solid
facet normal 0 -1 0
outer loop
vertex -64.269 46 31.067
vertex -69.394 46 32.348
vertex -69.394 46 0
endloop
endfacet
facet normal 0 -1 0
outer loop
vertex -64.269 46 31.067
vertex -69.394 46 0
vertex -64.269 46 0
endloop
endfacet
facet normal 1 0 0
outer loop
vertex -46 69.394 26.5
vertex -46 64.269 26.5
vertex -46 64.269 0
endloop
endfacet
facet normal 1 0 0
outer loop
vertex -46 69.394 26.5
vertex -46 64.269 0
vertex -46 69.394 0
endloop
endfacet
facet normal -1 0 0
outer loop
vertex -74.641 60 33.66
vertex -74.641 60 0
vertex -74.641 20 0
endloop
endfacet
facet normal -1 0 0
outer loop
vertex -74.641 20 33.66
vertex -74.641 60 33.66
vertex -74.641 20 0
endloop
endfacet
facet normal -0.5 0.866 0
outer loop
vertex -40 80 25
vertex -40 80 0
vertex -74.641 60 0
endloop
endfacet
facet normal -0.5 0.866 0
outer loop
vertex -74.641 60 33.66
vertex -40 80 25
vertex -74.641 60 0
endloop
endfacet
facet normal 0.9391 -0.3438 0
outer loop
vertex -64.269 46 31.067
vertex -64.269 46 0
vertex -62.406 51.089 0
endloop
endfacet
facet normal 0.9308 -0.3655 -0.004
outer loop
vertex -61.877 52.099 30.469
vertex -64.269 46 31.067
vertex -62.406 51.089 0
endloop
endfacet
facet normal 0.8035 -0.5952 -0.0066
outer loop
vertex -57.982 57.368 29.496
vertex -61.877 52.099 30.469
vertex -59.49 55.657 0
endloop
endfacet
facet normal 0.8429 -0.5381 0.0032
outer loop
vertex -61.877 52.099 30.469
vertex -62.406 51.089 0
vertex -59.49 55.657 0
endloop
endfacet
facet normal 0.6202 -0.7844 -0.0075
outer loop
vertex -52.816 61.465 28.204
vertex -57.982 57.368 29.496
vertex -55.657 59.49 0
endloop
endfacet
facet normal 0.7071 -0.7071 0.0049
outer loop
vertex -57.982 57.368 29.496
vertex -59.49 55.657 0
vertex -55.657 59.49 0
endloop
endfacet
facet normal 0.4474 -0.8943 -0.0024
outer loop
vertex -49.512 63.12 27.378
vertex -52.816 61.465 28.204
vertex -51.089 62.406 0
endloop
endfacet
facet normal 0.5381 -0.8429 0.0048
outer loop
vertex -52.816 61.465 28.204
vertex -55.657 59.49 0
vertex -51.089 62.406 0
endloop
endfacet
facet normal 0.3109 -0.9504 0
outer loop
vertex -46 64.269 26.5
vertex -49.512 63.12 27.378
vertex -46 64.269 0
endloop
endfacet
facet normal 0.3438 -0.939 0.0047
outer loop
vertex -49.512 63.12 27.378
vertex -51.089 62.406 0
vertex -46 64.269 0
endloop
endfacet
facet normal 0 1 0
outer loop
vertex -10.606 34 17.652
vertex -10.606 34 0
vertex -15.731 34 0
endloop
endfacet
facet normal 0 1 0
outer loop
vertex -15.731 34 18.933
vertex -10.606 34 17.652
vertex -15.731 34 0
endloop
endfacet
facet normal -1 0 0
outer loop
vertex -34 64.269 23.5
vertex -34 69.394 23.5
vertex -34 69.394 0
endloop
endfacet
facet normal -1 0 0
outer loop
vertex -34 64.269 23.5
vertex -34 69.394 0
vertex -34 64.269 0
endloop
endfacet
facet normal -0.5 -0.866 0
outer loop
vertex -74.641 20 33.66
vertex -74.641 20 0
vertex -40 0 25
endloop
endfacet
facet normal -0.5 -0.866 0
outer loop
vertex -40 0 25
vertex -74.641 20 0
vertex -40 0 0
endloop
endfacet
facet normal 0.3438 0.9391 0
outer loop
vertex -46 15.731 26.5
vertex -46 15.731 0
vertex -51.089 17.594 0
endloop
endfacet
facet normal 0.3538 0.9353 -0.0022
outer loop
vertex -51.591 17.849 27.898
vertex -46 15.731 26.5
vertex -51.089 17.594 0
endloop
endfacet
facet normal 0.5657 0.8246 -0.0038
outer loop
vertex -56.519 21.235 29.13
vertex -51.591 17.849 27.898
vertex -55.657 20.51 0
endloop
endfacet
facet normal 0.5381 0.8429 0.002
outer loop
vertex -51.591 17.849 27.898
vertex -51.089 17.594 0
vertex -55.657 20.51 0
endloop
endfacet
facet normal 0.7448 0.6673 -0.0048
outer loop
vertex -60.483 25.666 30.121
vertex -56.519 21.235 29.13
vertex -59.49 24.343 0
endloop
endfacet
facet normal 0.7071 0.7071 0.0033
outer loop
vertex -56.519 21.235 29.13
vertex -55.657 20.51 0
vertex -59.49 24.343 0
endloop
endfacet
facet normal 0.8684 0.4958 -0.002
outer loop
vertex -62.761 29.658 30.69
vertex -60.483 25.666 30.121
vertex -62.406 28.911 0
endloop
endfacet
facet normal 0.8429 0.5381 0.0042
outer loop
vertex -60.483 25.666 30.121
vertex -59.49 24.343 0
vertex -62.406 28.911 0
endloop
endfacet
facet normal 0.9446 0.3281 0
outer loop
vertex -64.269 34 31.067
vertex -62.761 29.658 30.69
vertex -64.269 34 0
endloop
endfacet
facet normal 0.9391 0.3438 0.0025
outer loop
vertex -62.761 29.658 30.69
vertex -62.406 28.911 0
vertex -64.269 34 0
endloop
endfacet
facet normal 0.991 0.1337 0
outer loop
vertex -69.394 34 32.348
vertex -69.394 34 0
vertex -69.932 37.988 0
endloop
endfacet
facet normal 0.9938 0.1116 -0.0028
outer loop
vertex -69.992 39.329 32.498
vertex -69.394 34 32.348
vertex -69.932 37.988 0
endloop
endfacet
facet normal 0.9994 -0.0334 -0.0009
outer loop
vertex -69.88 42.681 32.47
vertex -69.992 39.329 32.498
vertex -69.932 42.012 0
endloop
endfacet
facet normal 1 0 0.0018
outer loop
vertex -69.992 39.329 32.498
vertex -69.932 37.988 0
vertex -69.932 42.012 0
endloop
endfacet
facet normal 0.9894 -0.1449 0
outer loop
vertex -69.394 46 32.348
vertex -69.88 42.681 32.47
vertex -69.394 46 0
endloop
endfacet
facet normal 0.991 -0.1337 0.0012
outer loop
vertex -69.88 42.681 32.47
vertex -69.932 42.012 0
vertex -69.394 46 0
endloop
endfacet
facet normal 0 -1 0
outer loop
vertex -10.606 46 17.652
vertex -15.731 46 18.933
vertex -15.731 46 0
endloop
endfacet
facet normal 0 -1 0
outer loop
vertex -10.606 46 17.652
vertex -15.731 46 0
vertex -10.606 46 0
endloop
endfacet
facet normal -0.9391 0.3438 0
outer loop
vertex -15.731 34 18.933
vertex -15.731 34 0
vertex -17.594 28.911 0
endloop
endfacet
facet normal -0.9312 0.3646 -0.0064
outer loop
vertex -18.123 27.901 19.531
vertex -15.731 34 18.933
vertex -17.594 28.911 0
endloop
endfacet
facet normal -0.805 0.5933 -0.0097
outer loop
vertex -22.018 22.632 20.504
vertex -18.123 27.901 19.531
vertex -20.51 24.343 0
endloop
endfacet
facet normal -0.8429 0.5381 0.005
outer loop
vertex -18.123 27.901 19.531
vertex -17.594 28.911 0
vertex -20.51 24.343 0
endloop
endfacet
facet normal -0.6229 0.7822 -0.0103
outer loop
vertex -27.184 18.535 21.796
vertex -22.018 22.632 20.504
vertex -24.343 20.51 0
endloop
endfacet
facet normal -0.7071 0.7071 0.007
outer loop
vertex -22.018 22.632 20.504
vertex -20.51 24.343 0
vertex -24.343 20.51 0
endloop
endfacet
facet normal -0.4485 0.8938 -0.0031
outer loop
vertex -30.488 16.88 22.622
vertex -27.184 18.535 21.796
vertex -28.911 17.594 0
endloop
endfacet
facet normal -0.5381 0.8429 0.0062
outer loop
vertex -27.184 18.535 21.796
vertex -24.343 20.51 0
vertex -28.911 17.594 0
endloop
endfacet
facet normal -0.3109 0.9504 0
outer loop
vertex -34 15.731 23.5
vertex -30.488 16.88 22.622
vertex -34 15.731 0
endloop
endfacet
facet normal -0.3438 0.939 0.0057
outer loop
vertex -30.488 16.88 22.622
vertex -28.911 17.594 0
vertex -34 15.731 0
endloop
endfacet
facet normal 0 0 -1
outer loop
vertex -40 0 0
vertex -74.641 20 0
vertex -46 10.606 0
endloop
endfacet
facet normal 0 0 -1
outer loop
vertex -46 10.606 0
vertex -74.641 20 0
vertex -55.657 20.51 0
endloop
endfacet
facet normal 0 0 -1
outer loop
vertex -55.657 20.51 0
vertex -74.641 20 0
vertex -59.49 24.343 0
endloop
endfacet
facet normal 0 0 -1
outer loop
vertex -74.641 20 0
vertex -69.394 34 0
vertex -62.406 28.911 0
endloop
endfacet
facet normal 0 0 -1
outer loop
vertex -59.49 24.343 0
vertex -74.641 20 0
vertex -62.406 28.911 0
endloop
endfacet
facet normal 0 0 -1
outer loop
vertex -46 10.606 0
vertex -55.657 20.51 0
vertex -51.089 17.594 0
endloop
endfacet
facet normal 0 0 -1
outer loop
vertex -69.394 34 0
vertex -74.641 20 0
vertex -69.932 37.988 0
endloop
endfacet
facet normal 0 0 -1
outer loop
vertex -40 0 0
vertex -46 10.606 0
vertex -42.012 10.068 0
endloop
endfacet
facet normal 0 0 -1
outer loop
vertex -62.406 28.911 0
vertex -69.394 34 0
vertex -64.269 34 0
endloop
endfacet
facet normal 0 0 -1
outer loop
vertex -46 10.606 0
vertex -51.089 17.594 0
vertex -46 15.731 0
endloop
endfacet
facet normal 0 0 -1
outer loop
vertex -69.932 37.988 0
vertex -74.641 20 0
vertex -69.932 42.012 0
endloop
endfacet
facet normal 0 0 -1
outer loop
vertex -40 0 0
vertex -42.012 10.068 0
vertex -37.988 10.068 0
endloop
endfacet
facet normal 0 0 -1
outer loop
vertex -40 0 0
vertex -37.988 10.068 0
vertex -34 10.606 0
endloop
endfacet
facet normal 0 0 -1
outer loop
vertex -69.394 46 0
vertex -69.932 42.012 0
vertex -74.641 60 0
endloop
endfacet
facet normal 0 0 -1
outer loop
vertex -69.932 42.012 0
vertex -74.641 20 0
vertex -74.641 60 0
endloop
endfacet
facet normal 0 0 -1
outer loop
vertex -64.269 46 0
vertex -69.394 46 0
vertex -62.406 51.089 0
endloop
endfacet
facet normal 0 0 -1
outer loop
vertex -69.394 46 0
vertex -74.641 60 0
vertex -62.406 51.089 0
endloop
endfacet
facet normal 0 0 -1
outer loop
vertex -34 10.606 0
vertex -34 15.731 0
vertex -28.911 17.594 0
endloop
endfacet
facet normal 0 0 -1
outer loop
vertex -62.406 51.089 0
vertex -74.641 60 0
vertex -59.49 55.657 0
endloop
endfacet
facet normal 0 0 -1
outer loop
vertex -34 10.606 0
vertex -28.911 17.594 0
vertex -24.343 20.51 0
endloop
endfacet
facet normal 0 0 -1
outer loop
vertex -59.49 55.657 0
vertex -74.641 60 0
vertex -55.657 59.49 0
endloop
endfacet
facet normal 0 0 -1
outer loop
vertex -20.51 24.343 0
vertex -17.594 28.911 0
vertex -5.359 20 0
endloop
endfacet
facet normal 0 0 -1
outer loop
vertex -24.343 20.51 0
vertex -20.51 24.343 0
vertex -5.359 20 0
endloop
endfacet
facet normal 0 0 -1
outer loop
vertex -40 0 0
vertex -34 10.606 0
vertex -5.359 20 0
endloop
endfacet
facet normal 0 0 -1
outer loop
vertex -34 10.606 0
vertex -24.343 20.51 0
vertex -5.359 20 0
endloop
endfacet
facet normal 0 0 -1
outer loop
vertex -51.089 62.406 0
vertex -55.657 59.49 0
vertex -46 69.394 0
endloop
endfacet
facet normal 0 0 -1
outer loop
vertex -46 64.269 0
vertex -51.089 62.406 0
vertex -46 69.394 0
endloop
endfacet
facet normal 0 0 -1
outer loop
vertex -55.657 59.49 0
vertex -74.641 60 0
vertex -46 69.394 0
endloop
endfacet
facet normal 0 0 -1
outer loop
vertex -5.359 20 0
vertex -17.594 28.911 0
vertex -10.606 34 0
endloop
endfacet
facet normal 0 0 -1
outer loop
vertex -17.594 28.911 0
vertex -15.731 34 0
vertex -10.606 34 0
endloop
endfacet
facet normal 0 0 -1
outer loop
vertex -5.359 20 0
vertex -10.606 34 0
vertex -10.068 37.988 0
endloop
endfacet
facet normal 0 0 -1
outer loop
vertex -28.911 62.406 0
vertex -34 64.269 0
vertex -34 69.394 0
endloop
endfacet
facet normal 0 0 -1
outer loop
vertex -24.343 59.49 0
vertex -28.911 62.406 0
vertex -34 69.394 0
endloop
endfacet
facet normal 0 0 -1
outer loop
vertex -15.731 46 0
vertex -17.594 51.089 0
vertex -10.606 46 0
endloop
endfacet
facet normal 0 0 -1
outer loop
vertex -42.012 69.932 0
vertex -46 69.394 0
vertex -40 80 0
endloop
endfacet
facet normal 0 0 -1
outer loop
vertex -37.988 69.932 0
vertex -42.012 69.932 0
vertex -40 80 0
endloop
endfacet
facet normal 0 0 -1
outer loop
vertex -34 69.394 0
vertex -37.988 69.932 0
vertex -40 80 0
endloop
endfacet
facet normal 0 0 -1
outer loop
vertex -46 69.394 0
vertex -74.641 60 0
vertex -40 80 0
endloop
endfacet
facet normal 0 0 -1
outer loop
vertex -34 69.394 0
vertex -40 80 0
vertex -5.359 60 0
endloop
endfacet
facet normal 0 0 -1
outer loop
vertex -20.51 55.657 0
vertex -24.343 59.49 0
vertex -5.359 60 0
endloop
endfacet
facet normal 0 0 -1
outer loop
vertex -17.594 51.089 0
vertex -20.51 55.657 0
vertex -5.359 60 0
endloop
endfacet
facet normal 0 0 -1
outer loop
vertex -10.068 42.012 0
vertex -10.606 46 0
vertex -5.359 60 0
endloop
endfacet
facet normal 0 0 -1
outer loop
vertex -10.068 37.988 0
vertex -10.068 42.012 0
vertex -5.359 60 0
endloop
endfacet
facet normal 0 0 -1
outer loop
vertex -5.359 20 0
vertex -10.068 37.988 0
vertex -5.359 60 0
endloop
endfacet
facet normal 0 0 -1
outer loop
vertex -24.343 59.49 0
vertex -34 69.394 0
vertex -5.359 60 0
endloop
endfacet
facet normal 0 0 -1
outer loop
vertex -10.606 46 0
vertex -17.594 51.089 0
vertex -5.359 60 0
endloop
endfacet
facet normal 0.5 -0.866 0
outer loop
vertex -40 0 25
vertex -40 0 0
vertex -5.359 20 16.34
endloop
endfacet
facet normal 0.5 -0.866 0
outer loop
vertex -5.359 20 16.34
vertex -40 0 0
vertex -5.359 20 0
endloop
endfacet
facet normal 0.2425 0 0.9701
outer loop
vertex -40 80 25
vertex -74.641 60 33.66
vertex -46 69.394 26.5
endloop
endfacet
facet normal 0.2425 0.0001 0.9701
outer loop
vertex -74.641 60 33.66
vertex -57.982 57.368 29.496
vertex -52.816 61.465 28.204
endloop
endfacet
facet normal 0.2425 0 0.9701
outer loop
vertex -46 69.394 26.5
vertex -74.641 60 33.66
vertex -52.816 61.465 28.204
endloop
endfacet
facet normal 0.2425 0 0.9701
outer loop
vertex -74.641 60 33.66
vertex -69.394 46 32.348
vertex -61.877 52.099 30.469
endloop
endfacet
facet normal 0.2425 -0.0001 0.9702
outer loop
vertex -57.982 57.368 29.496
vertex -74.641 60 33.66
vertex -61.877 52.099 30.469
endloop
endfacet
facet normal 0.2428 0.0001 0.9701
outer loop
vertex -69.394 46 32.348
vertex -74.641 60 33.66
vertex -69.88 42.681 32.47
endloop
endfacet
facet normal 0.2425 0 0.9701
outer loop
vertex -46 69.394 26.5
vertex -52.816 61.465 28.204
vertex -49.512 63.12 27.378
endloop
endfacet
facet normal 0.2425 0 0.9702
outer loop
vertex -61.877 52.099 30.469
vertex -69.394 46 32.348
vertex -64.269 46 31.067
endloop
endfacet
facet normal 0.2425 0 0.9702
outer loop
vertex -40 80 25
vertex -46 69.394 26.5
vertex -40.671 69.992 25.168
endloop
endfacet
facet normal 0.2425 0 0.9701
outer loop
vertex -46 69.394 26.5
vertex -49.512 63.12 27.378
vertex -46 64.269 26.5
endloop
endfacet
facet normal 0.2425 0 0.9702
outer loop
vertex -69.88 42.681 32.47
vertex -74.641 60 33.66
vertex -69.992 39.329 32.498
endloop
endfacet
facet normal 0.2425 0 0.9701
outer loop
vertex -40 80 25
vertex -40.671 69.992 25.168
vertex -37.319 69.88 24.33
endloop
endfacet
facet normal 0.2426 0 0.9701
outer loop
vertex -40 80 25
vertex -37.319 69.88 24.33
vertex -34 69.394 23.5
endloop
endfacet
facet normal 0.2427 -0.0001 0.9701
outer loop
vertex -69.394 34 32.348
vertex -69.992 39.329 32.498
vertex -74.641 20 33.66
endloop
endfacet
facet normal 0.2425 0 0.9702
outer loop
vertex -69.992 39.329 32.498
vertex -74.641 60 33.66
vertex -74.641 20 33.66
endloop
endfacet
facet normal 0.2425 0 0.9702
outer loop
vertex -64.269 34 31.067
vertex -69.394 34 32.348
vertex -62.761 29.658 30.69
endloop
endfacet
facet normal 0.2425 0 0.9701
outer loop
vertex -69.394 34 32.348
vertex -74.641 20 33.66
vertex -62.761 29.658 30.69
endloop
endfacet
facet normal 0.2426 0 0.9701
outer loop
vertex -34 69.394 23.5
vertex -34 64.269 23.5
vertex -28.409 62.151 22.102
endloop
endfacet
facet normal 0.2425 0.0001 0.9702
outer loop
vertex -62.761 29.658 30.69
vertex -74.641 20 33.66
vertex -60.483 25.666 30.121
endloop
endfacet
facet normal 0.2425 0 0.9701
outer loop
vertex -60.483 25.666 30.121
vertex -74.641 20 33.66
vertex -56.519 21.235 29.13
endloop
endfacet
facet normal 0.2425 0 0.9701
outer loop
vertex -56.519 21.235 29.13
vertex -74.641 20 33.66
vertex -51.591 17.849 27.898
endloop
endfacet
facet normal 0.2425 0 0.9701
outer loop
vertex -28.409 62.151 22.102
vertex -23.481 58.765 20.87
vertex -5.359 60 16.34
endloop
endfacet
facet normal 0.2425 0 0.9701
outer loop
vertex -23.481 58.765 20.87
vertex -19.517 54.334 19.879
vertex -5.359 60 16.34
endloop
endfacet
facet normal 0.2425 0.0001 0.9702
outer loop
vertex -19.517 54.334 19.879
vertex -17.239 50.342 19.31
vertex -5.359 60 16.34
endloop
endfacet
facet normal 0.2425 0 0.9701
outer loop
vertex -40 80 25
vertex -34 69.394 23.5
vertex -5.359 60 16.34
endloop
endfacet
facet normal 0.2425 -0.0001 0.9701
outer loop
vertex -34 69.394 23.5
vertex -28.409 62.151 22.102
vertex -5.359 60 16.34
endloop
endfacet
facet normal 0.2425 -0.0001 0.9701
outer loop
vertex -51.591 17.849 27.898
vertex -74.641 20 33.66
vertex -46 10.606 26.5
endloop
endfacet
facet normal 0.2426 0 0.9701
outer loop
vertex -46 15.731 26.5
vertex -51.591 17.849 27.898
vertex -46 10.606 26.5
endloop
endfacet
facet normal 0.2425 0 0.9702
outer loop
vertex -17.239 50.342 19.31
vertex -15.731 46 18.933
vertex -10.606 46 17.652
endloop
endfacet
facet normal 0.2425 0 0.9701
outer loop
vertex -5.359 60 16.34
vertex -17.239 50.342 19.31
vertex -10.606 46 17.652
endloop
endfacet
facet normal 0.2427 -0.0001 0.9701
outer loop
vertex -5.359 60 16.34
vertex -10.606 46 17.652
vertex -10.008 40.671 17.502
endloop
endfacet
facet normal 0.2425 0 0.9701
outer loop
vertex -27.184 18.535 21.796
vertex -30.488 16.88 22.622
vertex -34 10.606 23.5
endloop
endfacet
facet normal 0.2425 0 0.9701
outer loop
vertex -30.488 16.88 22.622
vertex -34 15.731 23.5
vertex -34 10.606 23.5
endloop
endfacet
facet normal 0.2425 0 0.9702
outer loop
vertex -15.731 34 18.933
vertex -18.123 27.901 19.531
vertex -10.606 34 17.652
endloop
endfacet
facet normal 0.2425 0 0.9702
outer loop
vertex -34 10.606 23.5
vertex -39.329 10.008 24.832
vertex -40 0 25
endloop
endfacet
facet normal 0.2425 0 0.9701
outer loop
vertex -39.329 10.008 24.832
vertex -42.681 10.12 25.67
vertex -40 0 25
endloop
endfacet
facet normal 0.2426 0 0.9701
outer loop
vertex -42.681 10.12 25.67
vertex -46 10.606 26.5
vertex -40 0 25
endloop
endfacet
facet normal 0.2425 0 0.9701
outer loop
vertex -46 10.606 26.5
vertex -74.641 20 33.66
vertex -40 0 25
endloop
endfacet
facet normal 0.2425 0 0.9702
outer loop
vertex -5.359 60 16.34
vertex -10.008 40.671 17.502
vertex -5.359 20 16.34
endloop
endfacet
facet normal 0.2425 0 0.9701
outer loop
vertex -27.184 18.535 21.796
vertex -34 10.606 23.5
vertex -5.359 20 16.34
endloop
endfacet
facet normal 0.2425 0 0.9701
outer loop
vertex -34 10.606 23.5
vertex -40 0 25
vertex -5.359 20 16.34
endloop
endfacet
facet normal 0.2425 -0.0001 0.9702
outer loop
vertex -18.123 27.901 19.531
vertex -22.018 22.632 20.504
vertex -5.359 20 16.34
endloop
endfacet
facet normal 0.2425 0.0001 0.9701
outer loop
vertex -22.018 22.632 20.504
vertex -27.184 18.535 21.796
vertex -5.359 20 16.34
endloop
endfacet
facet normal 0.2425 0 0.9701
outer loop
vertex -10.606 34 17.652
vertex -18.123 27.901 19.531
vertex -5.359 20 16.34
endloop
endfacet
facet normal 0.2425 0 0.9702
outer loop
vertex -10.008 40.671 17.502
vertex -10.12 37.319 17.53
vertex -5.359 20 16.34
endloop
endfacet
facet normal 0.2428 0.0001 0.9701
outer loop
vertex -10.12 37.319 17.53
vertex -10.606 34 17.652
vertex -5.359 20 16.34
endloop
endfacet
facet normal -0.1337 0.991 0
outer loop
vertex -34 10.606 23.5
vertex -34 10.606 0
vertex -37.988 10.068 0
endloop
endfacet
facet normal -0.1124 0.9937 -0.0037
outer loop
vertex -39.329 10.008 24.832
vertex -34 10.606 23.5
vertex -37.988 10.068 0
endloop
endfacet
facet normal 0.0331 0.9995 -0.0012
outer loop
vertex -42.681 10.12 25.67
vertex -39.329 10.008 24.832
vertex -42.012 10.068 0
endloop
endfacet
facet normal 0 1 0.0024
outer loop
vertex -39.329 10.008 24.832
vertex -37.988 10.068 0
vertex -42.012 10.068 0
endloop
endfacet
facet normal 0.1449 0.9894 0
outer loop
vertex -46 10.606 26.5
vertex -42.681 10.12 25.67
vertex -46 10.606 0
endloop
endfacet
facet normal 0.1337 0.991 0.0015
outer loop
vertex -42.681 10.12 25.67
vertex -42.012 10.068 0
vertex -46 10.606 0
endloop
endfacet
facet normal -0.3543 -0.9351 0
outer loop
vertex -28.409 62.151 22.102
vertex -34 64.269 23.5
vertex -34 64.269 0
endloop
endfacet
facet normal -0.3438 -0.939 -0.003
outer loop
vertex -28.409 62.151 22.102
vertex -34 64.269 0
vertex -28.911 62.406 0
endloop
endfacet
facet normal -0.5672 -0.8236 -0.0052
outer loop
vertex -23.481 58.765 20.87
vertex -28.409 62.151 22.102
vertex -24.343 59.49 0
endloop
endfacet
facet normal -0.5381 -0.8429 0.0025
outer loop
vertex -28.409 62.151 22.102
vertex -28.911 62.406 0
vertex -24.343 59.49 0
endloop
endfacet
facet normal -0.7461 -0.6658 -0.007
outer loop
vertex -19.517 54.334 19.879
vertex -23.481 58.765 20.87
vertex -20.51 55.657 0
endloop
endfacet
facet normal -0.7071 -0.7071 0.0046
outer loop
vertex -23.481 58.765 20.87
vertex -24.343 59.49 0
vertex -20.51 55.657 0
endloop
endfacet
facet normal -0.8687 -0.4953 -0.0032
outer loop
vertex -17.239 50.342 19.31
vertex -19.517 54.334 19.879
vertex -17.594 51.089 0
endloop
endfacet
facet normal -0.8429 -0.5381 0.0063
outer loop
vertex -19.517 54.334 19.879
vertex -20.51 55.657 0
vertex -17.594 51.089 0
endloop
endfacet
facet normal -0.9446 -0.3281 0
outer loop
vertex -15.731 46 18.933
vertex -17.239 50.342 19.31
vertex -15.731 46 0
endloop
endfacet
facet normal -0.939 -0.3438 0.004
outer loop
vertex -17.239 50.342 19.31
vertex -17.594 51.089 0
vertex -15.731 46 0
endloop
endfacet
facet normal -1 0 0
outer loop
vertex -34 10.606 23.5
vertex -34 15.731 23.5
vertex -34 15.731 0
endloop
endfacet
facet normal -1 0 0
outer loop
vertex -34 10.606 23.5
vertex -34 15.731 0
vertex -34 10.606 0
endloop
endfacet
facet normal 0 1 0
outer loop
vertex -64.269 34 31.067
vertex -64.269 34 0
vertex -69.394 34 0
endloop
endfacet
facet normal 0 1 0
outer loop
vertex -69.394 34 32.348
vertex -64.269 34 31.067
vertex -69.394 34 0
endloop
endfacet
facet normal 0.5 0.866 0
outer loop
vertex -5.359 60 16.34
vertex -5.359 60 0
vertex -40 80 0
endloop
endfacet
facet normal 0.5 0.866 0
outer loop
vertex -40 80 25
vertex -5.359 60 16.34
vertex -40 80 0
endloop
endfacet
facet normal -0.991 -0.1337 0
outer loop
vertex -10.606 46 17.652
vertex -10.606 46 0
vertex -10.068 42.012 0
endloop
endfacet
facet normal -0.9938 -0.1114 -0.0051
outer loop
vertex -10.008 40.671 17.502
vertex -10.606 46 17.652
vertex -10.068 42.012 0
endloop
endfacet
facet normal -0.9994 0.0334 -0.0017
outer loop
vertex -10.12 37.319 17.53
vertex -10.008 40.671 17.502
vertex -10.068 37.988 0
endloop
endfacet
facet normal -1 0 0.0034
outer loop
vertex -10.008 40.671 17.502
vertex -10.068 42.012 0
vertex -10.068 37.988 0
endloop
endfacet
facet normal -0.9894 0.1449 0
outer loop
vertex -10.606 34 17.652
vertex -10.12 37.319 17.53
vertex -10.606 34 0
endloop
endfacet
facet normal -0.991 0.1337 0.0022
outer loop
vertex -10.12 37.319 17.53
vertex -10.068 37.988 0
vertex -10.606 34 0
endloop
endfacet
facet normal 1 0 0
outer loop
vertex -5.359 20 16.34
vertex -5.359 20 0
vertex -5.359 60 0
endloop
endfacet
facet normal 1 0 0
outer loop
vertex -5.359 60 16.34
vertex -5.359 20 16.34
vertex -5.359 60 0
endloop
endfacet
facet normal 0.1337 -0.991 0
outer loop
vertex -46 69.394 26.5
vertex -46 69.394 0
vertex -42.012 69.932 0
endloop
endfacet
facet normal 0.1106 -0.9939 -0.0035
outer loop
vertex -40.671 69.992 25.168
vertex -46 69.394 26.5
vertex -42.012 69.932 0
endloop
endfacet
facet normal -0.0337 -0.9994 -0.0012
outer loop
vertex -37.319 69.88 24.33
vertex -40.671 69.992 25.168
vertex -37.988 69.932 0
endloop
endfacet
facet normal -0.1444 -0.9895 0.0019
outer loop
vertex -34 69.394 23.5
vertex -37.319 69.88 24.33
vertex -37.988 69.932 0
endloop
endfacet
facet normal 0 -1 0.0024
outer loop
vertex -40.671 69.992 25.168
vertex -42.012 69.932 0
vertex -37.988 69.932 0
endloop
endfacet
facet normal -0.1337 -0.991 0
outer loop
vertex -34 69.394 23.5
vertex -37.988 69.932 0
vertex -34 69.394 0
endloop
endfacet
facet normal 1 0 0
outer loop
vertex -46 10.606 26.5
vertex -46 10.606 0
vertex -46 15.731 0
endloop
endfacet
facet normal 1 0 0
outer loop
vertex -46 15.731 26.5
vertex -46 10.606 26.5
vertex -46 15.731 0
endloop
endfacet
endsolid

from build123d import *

# Parameters (mm, degrees)
SKETCH1_W           = 80
SKETCH1_H           = 80
BOSS_EXTRUDE1_DEPTH = 35
CUT_EXTRUDE1_REACH  = 120.427
CUT_EXTRUDE2_DEPTH  = 35


with BuildPart() as part:
    # Sketch1 → Boss-Extrude1 (new body)
    with BuildSketch(Plane.XY):
        with Locations((-40, 40)):
            Rectangle(SKETCH1_W, SKETCH1_H)
    extrude(amount=BOSS_EXTRUDE1_DEPTH)

    # Sketch4 → Cut-Extrude1 (cut, up to next)
    with BuildSketch(Plane.XZ, mode=Mode.PRIVATE) as cut_extrude1_sk1:
        Polygon((-80, 35), (0, 15), (0, 35), align=None)
    cut_extrude1_tool1 = extrude(cut_extrude1_sk1.sketch, amount=-CUT_EXTRUDE1_REACH, mode=Mode.PRIVATE) & part.part
    add(cut_extrude1_tool1.solids().sort_by_distance((-26.666667, 0, 28.333333))[0], mode=Mode.SUBTRACT)

    # Sketch5 → Cut-Extrude2 (cut)
    with BuildSketch(Plane(origin=(0, 0, 0), x_dir=(-1, 0, 0), z_dir=(0, 0, -1))):
        with BuildLine():
            Line((34, 69.393876913), (34, 64.269322199))
            ThreePointArc((34, 64.269322199), (22.32233047, 57.67766953), (15.730677801, 46))
            Line((15.730677801, 46), (10.606123087, 46))
            ThreePointArc((10.606123087, 46), (10, 40), (10.606123087, 34))
            Line((10.606123087, 34), (15.730677801, 34))
            ThreePointArc((15.730677801, 34), (22.32233047, 22.32233047), (34, 15.730677801))
            Line((34, 15.730677801), (34, 10.606123087))
            ThreePointArc((34, 10.606123087), (40, 10), (46, 10.606123087))
            Line((46, 10.606123087), (46, 15.730677801))
            ThreePointArc((46, 15.730677801), (57.67766953, 22.32233047), (64.269322199, 34))
            Line((64.269322199, 34), (69.393876913, 34))
            ThreePointArc((69.393876913, 34), (70, 40), (69.393876913, 46))
            Line((69.393876913, 46), (64.269322199, 46))
            ThreePointArc((64.269322199, 46), (57.67766953, 57.67766953), (46, 64.269322199))
            Line((46, 64.269322199), (46, 69.393876913))
            ThreePointArc((46, 69.393876913), (40, 70), (34, 69.393876913))
        make_face()
        Polygon((5.358983849, 60), (40, 80), (0, 80), (0, 0), (40, 0), (5.358983849, 20), align=None)
        Polygon((80, 80), (40, 80), (74.641016151, 60), (74.641016151, 20), (40, 0), (80, 0), align=None)
    extrude(amount=-CUT_EXTRUDE2_DEPTH, mode=Mode.SUBTRACT)


solid = part.part
